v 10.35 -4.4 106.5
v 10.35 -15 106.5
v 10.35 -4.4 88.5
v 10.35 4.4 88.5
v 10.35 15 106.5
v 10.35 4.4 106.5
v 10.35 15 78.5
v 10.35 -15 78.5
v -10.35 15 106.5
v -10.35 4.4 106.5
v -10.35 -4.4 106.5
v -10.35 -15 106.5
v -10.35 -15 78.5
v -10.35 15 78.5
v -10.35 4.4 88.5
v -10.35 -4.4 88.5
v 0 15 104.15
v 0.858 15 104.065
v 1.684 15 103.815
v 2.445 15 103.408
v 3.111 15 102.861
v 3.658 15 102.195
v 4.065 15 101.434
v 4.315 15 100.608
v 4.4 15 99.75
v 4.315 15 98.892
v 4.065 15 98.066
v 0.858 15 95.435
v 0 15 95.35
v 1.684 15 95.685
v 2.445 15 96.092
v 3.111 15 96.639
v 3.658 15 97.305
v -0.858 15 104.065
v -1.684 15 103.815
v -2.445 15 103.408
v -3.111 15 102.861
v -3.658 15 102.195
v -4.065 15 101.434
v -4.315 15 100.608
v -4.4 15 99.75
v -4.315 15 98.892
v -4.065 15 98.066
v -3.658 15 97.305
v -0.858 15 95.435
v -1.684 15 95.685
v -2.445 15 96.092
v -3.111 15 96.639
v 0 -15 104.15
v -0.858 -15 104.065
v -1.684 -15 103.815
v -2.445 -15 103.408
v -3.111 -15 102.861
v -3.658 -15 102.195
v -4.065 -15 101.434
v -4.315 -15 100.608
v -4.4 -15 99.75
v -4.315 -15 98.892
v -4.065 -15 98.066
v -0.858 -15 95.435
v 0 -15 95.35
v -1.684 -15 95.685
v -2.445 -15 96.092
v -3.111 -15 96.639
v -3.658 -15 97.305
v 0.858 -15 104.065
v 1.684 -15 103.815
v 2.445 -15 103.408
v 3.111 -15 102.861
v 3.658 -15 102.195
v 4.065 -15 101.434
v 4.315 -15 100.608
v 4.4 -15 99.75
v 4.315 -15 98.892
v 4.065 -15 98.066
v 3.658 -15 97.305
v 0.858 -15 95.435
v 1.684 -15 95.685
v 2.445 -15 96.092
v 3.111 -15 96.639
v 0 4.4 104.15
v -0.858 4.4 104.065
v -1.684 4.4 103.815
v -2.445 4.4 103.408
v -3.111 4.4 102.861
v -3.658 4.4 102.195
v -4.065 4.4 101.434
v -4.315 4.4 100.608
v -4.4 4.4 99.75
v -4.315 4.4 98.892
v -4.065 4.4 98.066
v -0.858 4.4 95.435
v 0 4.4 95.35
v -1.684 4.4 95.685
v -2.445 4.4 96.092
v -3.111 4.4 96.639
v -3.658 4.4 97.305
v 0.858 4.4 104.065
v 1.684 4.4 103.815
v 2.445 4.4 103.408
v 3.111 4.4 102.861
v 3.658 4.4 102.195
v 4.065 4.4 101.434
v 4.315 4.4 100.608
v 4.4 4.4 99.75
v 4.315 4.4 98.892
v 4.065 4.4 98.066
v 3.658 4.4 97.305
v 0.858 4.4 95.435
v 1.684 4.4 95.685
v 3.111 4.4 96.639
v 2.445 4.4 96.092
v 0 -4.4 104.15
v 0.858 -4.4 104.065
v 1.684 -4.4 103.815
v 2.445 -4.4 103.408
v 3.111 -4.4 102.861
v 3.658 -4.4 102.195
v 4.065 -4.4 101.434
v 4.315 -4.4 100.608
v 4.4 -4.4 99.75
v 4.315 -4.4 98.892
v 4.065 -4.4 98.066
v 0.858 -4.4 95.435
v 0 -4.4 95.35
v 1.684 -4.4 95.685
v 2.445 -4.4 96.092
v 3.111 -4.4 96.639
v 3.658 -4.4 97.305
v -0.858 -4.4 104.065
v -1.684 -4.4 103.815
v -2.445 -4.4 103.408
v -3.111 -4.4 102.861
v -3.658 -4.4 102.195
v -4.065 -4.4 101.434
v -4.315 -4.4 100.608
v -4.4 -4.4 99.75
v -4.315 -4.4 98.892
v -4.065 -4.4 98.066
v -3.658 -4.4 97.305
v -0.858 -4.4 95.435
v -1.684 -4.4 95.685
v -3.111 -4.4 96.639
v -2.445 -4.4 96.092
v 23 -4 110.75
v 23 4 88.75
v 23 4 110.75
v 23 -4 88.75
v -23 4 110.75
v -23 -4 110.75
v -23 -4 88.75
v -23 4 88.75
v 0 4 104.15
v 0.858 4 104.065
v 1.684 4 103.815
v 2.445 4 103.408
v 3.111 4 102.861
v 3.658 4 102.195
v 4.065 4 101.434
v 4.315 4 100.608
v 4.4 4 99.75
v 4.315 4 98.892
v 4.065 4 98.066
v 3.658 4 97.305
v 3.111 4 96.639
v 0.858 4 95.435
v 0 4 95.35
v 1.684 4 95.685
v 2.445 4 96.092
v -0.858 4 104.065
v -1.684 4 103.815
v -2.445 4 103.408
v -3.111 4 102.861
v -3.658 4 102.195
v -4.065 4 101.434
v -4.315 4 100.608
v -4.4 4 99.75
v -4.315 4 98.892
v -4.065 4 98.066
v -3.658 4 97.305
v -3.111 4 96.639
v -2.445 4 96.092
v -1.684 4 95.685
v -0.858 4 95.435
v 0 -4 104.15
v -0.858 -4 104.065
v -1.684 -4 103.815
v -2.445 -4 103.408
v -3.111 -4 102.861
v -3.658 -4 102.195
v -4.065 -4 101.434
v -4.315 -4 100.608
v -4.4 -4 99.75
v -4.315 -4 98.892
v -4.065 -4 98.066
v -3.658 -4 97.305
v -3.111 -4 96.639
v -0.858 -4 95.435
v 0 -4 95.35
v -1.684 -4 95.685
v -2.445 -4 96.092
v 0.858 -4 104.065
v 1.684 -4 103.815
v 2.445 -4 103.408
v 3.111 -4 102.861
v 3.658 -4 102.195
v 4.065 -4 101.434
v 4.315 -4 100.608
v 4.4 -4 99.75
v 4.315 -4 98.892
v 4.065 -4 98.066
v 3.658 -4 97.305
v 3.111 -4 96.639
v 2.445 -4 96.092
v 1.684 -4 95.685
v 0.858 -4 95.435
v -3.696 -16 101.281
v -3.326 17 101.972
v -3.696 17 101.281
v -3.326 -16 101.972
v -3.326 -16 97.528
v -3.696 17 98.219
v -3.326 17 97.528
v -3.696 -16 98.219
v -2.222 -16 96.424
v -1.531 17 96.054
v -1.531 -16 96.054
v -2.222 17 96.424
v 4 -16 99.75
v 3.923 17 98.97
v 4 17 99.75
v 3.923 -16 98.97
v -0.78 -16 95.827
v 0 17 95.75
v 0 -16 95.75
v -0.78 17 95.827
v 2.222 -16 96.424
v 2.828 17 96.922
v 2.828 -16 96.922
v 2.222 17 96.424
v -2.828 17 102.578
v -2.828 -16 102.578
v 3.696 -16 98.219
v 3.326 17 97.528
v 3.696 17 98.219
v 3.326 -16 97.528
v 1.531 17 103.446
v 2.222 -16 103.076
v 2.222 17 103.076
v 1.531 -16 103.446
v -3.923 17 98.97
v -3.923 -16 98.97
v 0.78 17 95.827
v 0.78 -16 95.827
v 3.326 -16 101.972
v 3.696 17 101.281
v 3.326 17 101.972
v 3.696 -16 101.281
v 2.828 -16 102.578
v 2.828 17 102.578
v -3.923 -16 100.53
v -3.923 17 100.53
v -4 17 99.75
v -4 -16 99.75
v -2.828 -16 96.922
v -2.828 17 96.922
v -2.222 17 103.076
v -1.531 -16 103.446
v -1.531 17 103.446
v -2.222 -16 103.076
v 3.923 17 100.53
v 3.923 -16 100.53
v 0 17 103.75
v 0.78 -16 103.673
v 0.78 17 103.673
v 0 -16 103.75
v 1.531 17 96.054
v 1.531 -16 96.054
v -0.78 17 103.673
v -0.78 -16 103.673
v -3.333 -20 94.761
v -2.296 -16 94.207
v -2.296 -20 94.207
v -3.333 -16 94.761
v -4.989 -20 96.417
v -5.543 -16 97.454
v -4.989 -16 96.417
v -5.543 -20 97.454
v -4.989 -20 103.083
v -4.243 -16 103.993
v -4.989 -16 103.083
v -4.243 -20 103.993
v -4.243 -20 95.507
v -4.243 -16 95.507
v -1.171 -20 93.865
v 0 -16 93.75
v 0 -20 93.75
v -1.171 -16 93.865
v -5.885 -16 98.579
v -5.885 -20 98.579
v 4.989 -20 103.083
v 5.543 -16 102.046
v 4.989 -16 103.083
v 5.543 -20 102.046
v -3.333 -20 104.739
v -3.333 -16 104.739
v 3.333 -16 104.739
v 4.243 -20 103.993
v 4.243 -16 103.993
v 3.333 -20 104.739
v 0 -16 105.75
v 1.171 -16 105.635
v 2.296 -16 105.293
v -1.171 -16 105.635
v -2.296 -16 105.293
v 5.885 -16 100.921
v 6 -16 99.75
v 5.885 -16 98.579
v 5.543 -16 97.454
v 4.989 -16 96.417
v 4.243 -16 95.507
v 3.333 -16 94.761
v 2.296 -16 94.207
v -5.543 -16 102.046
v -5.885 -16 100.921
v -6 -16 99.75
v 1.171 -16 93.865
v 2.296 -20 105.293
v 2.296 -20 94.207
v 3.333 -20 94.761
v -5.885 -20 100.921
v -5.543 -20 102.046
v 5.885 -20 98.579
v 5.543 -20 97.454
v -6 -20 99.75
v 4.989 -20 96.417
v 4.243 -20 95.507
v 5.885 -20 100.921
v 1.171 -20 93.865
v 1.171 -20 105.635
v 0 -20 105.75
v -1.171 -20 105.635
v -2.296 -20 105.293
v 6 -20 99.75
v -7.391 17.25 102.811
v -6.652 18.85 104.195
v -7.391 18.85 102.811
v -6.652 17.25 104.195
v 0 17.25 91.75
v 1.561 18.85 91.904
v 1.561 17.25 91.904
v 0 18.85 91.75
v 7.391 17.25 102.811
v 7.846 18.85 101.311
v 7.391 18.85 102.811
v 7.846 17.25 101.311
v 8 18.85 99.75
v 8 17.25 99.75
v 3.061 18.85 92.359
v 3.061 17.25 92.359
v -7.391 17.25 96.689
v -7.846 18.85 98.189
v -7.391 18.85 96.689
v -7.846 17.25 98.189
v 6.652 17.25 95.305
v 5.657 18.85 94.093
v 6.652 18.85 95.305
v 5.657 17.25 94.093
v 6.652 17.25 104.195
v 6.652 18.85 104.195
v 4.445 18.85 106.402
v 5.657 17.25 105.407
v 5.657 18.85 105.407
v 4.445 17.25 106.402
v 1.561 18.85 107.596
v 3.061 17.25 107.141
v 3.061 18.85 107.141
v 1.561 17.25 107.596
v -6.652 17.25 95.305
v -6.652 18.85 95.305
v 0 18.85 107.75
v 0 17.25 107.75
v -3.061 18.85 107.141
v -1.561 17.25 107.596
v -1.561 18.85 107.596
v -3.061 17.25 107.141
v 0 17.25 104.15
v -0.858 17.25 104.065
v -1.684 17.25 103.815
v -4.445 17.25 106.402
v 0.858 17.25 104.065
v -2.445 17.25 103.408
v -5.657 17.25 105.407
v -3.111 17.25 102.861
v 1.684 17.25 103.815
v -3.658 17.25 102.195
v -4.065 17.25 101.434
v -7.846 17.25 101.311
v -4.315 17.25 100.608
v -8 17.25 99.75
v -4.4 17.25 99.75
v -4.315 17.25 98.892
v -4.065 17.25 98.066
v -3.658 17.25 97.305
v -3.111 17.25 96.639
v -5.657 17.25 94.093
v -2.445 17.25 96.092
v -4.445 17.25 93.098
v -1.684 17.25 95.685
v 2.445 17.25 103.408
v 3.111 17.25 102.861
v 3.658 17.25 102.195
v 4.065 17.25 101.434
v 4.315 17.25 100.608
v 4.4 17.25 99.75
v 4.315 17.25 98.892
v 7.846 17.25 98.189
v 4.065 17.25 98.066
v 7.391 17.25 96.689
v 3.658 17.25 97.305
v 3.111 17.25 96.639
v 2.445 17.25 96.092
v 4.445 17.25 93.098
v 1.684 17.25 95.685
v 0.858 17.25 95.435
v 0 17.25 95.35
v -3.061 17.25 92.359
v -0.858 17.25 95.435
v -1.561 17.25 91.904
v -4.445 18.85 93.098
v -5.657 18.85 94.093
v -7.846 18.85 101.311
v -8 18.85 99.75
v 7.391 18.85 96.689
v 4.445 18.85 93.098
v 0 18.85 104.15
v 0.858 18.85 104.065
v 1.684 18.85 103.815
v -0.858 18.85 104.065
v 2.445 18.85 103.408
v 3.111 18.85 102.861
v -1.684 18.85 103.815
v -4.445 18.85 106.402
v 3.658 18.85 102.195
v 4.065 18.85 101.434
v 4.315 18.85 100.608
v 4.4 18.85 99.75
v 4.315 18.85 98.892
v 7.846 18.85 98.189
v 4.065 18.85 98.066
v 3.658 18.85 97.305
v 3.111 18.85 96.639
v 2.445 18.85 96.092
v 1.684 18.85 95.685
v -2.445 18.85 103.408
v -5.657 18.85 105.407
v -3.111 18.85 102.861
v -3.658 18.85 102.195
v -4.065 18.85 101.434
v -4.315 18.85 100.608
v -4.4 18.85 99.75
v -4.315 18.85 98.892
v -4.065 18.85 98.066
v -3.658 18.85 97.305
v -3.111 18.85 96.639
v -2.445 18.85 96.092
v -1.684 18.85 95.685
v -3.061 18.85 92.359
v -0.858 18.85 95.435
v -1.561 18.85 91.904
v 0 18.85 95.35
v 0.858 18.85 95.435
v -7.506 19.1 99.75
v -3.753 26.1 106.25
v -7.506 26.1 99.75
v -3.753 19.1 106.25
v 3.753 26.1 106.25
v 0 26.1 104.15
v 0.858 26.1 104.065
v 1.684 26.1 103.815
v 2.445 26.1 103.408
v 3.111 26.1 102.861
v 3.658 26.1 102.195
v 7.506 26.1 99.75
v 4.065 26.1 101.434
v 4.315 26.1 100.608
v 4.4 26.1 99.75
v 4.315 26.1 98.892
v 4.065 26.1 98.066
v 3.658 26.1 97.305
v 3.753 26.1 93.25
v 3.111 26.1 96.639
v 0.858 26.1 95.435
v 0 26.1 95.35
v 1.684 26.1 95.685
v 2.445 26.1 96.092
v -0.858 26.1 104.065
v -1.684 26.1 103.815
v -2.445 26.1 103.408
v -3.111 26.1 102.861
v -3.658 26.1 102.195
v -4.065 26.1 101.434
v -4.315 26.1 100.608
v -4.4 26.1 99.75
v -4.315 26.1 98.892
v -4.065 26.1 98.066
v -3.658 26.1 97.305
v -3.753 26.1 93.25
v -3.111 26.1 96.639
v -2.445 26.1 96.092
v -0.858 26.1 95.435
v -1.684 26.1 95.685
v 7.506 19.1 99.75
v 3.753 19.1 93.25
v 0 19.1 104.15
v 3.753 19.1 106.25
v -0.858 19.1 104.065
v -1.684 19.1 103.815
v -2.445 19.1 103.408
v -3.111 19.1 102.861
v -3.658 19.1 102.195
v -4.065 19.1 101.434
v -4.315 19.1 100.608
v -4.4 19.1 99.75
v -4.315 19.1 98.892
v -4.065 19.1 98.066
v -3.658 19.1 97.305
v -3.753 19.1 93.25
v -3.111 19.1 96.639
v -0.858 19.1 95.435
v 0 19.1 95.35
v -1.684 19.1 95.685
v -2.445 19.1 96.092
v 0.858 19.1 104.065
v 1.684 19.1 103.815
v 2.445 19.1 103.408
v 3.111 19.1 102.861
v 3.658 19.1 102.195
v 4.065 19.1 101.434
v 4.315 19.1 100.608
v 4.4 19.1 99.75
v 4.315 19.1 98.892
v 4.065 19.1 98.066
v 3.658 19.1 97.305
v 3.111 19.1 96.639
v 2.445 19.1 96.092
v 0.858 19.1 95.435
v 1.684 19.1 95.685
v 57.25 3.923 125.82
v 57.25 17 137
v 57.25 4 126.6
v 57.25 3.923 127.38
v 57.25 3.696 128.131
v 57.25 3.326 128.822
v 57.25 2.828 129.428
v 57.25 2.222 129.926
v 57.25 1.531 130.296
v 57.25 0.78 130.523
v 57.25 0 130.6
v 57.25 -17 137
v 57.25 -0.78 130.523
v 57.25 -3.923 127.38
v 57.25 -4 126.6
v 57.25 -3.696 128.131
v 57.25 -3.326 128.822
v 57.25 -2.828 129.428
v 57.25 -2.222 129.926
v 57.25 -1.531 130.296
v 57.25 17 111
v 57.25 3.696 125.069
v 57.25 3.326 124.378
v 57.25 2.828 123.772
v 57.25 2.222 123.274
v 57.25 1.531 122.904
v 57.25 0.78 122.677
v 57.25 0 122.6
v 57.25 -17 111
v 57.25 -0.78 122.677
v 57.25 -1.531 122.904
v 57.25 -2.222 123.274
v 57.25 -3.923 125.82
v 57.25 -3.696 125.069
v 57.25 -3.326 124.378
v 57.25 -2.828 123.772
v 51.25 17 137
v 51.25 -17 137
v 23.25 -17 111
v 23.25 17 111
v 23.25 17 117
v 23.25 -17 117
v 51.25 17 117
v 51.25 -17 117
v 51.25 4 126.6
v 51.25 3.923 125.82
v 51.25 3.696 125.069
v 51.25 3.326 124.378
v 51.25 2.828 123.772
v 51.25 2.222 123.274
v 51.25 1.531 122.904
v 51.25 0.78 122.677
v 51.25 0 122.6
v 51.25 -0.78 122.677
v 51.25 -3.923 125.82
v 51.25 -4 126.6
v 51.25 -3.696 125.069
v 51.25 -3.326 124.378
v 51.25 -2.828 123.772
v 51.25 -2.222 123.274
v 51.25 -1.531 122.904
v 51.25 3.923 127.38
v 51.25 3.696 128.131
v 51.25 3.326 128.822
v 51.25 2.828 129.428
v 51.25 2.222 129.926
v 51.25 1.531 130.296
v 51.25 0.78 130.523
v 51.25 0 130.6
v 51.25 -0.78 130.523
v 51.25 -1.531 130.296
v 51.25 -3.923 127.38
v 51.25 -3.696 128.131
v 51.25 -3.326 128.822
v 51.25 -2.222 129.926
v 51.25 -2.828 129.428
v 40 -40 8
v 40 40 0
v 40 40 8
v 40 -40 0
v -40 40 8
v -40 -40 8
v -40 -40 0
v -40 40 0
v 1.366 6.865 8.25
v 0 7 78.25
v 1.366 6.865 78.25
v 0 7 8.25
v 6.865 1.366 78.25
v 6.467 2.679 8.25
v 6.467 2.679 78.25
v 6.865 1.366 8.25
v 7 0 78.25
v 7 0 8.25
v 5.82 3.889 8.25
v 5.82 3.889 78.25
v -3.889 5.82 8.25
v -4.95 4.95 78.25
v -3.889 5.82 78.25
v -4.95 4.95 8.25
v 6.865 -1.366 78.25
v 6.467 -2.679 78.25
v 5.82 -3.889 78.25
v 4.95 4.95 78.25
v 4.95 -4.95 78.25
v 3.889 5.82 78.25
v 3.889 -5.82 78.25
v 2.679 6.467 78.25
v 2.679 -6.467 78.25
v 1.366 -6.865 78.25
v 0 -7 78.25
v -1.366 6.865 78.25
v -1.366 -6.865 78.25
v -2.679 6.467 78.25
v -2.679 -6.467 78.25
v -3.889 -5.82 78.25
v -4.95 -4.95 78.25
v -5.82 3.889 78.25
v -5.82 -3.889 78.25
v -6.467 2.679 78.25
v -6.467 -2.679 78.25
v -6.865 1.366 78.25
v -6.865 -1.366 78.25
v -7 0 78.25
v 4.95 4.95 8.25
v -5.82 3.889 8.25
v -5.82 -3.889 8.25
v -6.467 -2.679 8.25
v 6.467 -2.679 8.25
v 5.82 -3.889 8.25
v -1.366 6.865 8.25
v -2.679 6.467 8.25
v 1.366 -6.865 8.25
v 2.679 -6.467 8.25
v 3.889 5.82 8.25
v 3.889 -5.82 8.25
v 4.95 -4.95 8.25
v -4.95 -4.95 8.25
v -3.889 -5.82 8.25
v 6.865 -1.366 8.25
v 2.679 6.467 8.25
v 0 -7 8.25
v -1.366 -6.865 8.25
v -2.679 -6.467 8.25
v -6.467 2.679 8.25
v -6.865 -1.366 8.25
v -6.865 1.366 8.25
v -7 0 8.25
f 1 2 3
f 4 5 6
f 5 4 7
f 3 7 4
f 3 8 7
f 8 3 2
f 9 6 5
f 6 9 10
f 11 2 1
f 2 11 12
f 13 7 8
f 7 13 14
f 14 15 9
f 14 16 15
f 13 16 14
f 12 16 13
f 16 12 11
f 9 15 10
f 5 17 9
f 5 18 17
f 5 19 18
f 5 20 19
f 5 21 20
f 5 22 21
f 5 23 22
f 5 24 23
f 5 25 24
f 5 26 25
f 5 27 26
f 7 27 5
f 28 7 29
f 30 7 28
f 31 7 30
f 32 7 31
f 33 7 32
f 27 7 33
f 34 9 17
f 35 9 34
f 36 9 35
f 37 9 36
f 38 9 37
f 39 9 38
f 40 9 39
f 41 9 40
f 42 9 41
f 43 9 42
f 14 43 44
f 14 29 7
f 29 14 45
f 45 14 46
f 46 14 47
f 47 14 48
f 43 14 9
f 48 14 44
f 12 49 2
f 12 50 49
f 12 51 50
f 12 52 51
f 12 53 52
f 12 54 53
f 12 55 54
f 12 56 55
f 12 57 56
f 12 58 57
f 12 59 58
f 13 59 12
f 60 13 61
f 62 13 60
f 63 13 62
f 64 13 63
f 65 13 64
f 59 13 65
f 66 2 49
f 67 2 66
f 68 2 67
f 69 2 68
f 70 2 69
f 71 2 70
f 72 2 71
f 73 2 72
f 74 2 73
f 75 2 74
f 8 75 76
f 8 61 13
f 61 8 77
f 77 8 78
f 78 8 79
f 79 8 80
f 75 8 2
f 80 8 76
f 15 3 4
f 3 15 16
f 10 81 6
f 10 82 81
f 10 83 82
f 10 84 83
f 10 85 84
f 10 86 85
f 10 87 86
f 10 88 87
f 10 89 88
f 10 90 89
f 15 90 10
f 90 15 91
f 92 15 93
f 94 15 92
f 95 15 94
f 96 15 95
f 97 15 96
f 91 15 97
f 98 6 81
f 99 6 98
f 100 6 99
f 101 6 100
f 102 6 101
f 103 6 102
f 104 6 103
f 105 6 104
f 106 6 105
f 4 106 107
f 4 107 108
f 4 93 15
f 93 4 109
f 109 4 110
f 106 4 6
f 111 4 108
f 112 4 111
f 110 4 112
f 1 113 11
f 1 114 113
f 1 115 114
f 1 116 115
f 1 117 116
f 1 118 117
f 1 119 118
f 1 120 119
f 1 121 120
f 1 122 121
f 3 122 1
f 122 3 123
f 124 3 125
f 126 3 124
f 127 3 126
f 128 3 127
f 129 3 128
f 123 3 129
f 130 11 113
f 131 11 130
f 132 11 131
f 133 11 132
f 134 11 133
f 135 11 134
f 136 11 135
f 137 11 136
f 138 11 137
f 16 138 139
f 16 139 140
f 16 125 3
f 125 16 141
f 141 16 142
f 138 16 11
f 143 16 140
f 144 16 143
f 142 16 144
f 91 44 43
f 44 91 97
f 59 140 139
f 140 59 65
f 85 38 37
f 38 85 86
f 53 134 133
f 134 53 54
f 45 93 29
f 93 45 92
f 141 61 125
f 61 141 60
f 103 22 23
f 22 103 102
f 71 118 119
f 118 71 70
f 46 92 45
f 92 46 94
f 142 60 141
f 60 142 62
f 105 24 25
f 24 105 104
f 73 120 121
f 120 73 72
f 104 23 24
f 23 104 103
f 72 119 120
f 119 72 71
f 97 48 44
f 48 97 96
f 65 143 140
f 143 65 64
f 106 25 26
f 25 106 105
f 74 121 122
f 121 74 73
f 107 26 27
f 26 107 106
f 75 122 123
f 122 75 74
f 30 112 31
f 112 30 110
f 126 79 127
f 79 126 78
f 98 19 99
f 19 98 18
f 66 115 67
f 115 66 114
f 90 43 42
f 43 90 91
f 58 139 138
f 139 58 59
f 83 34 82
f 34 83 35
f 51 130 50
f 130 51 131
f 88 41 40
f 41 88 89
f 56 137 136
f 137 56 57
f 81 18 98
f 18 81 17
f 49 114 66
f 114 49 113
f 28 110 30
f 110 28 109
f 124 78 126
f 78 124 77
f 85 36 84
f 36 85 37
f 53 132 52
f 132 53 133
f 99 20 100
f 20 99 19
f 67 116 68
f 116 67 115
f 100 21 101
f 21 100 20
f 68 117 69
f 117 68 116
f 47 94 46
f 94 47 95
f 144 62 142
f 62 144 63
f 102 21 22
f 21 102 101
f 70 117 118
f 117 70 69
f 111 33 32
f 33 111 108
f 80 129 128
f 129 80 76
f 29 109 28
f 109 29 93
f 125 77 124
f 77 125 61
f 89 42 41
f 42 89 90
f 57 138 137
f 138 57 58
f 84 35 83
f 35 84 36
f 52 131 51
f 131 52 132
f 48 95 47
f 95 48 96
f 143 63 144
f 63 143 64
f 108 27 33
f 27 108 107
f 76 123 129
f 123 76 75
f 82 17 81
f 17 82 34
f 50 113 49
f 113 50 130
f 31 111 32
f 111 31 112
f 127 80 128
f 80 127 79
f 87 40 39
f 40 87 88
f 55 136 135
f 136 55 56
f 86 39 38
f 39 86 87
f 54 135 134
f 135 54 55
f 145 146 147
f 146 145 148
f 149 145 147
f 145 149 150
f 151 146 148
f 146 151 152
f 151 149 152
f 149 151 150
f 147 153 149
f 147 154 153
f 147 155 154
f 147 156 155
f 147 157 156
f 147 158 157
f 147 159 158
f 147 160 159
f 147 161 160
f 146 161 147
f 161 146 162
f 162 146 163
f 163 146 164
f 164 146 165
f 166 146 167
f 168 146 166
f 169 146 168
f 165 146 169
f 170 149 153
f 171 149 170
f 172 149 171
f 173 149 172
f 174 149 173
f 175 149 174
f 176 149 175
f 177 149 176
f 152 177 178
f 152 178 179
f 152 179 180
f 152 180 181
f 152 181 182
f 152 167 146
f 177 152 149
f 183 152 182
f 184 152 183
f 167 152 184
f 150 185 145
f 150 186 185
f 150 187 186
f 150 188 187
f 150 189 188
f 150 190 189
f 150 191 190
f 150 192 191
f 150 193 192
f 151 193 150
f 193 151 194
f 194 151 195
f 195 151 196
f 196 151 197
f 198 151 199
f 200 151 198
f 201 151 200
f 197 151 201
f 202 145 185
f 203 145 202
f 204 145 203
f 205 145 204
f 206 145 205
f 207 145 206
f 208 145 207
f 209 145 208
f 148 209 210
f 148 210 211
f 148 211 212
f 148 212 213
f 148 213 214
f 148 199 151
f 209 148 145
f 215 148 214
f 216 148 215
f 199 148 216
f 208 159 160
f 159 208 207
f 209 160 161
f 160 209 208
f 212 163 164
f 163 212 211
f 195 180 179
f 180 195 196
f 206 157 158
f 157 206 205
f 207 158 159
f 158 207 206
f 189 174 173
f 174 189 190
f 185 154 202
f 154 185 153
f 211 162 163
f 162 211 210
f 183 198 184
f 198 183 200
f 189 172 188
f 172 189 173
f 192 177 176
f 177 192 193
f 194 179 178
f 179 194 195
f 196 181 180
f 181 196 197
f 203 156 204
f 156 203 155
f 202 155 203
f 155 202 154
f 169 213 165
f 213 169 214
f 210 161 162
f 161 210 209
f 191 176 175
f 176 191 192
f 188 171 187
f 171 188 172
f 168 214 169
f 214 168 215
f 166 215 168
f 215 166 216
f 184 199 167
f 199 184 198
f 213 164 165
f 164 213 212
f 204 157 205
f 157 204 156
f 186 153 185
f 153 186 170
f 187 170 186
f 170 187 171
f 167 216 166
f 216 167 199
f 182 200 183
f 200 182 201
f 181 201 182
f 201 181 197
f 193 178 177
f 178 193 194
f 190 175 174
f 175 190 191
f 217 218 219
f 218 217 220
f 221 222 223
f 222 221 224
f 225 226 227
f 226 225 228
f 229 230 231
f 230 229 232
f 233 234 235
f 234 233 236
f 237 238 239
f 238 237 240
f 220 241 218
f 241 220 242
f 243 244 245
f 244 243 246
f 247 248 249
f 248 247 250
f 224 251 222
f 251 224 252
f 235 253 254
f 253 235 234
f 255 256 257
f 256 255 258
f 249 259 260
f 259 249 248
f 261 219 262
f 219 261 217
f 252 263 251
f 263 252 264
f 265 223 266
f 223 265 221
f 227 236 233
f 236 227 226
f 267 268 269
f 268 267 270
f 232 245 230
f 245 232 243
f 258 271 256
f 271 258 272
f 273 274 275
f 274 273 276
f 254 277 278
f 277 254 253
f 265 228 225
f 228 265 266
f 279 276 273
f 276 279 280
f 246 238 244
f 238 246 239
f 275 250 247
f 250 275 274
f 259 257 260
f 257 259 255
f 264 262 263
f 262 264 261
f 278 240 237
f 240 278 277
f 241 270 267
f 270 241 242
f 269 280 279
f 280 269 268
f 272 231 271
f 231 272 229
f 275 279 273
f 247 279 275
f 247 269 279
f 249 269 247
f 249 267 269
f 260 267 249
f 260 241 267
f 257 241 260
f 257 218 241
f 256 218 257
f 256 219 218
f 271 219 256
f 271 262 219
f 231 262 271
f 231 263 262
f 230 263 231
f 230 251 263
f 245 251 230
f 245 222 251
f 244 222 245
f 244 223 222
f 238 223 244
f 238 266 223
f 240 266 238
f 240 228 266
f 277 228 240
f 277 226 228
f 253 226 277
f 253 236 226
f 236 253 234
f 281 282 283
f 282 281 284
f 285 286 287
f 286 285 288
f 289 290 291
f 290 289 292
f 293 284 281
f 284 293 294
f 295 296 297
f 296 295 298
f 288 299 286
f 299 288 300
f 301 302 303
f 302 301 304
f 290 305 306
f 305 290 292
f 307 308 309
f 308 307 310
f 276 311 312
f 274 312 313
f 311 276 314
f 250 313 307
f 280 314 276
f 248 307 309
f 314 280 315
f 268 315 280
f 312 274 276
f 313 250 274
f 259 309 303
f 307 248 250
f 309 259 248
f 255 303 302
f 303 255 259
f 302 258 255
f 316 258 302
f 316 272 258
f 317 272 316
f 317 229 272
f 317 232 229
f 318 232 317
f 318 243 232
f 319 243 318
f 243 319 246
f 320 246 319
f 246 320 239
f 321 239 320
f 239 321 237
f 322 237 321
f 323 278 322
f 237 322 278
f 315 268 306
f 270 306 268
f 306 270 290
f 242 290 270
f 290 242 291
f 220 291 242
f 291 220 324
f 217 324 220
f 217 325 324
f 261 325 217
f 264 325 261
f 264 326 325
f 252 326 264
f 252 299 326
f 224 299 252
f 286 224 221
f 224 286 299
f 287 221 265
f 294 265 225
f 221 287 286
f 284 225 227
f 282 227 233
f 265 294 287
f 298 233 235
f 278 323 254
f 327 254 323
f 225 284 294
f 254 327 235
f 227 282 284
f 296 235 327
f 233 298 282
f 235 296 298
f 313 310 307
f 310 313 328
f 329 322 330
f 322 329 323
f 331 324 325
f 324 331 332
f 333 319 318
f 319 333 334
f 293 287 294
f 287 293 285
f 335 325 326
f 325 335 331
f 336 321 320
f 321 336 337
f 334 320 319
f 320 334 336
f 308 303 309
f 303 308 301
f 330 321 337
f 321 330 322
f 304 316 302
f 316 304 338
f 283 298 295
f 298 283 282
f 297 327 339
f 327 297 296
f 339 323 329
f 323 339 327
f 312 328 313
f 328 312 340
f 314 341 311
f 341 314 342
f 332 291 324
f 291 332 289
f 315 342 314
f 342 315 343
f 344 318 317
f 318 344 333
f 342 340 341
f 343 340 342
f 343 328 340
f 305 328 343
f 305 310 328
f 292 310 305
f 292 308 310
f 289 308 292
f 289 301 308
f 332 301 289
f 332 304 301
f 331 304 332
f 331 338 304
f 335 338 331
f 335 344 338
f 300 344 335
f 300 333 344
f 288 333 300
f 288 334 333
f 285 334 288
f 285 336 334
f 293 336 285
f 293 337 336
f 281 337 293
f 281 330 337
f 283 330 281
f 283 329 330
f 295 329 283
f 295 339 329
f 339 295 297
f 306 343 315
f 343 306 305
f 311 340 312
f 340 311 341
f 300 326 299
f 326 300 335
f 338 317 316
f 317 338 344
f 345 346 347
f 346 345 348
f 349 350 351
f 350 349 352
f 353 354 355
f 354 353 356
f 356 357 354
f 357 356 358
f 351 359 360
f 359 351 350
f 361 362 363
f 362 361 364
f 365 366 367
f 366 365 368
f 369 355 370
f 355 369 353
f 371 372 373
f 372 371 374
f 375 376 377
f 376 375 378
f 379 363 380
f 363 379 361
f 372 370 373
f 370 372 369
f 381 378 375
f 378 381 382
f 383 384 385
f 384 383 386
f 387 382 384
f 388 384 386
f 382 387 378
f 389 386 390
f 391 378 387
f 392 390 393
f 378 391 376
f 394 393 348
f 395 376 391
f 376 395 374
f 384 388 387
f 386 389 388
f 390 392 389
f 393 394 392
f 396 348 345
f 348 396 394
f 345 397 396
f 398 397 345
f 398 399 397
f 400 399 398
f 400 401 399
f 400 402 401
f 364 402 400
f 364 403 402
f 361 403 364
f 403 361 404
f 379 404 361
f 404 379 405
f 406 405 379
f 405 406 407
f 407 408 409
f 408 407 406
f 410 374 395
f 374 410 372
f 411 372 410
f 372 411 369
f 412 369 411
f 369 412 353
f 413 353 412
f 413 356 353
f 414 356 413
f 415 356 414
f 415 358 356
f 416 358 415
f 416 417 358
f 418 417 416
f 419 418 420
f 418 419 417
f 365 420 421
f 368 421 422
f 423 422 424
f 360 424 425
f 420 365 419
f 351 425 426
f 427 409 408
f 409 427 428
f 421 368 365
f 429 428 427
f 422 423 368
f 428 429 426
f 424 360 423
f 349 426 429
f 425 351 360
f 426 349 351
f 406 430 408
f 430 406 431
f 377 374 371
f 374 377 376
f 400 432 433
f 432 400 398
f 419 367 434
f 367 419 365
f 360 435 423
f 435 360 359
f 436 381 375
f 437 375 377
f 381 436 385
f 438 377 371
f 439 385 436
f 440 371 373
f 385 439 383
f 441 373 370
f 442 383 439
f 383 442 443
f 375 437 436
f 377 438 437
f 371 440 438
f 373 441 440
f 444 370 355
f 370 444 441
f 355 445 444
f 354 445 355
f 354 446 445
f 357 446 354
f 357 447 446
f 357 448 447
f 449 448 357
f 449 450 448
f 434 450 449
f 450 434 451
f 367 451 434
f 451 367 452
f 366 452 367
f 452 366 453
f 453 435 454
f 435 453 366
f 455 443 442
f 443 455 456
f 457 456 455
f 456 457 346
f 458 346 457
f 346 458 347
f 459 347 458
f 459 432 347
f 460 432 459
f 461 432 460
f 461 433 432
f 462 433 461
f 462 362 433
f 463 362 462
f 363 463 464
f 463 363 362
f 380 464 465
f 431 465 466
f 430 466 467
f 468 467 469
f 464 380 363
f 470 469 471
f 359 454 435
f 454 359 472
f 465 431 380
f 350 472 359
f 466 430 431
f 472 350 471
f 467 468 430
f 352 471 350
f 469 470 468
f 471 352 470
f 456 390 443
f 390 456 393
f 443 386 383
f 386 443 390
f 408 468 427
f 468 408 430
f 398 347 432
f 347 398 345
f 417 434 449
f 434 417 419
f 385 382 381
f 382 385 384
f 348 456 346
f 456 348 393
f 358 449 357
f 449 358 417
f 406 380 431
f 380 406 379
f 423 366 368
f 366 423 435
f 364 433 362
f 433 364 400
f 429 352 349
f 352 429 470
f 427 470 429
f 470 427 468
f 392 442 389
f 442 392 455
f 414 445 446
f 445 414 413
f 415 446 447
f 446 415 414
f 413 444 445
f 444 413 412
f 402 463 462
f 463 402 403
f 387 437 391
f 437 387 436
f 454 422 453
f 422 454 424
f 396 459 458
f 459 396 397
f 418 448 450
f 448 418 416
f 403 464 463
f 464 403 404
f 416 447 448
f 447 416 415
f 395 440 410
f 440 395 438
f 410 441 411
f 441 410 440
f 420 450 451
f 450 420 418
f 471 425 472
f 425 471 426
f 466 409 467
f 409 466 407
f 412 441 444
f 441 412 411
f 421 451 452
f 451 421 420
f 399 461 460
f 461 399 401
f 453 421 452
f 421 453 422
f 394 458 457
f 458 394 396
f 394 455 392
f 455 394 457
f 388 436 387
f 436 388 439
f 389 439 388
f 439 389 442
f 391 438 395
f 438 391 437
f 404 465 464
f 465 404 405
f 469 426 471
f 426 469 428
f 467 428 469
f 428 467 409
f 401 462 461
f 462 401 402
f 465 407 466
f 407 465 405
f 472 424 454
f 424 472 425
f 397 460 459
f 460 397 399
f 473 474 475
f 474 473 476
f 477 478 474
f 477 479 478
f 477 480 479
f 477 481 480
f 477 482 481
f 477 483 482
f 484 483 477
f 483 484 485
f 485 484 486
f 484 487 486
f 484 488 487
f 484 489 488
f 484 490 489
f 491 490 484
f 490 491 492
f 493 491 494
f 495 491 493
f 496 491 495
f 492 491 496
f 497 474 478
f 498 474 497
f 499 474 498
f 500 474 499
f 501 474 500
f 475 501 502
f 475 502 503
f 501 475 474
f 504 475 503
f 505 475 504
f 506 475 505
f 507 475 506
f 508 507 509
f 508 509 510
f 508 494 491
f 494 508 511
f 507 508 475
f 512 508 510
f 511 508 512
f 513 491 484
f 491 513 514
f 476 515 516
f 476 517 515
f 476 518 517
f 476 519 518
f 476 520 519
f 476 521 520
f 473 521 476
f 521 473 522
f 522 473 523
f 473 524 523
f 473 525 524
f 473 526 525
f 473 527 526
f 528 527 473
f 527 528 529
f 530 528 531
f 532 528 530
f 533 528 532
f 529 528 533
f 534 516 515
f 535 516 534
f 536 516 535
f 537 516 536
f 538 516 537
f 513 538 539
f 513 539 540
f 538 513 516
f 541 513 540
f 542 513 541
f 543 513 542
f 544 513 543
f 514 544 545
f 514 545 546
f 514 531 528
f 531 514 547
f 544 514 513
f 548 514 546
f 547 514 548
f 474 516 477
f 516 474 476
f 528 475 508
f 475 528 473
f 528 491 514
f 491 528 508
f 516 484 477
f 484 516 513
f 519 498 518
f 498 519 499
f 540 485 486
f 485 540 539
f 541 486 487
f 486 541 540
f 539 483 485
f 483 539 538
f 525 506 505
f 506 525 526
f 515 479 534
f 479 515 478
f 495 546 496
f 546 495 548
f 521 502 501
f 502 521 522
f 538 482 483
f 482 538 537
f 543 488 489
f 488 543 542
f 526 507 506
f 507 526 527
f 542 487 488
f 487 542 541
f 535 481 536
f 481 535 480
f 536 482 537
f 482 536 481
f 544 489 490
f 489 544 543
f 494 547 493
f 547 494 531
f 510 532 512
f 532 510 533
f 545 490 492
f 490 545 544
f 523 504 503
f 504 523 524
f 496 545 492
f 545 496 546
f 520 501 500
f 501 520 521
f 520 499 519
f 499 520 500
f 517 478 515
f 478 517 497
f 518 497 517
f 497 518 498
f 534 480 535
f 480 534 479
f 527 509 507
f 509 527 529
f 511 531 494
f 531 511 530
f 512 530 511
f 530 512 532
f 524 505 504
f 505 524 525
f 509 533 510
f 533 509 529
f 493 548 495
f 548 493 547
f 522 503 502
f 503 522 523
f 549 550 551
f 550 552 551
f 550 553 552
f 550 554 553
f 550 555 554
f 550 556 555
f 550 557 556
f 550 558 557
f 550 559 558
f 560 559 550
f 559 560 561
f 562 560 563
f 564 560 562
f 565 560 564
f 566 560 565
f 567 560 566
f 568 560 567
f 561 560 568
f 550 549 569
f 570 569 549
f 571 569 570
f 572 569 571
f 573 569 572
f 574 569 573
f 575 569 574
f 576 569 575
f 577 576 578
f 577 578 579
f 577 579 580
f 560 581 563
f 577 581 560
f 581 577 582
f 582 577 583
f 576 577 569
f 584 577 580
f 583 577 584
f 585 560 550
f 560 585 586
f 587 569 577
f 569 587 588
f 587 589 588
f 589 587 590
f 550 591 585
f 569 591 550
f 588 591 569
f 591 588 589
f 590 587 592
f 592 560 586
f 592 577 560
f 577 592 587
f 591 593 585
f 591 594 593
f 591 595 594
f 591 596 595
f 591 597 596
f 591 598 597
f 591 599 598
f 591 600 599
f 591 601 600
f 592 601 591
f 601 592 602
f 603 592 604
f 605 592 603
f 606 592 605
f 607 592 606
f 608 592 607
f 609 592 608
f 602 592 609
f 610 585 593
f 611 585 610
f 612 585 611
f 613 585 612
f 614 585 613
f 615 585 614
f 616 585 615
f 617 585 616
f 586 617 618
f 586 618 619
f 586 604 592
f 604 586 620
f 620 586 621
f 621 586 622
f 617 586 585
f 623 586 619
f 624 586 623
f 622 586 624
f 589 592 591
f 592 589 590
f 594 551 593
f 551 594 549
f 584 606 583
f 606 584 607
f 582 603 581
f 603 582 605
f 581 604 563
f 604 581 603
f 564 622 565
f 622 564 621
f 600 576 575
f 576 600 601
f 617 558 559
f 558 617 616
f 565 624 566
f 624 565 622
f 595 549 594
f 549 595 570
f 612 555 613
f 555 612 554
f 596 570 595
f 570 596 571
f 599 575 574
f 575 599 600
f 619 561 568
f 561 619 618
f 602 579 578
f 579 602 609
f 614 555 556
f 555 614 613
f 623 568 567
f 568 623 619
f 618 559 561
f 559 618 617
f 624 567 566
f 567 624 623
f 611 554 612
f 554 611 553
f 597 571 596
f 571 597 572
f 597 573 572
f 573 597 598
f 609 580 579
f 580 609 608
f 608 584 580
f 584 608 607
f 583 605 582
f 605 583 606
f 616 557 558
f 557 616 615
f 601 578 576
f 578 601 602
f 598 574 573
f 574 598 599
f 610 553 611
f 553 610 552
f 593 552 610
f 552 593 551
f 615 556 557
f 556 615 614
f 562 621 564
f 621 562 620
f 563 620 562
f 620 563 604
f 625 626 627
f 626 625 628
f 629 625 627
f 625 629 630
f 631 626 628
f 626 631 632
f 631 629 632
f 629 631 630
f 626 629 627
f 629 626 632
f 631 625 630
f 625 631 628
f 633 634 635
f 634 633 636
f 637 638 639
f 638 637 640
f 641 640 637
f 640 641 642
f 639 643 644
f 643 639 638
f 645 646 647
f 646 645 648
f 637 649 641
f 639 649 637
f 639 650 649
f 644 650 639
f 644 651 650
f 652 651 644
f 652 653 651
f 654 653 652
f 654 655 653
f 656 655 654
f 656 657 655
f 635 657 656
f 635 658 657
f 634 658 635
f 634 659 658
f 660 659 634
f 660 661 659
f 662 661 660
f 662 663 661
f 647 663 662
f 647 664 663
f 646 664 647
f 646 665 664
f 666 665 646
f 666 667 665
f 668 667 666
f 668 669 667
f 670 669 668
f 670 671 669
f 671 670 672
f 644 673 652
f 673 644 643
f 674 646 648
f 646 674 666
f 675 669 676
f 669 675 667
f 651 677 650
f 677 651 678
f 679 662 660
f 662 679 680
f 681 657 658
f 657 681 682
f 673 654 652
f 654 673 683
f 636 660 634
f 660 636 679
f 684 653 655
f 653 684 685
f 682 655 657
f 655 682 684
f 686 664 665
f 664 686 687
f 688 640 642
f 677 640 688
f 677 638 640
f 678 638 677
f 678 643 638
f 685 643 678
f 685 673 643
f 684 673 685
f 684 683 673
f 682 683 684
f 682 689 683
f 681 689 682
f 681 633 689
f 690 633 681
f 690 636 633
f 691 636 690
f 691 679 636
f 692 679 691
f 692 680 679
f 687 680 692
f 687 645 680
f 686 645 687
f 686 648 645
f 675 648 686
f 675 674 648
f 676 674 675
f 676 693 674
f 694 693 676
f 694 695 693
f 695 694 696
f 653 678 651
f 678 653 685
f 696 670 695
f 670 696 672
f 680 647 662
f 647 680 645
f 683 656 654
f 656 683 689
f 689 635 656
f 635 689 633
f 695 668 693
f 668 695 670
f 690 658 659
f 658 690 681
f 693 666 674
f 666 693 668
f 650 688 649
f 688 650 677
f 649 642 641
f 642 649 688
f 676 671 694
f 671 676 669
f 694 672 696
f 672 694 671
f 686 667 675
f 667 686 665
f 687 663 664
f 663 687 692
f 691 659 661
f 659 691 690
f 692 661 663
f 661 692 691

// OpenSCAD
$fn = 32;

// ------------------------------------------------------------------------
// Lamp arm: column d14 x 70 mm, arm 46 mm
// Every part is its own module, assembly() places every instance.
// ------------------------------------------------------------------------

// --- part 1 ---
module lamp_base() {
  difference() {
    translate([-40, -40, 0]) cube([80, 80, 8]);
  }
}

// --- part 2 ---
module lamp_column() {
  cylinder(h = 70, d = 14);
}

// --- part 3 ---
module head_fork() {
  difference() {
    translate([-10.35, -15, 0]) cube([20.7, 30, 28]);
    translate([-11.35, -4.4, 10]) cube([22.7, 8.8, 19]);
    translate([0, 0, 21.25]) rotate([90, 0, 0]) cylinder(h = 32, d = 8.8, center = true);
  }
}

// --- part 4 ---
module lamp_arm() {
  difference() {
    translate([-23, -4, 0]) cube([46, 8, 22]);
    translate([0, 0, 11]) rotate([90, 0, 0]) cylinder(h = 10, d = 8.8, center = true);
  }
}

// --- part 5 ---
module arm_pin() {
  rotate([0, 90, 0]) cylinder(h = 34, d = 8, center = true);
  translate([-20, 0, 0]) rotate([0, 90, 0]) cylinder(h = 4, d = 12);
}

// --- part 6 ---
module arm_washer() {
  difference() {
      translate([0, 0, 0]) cylinder(h = 1.6, d = 16);
      translate([0, 0, -1]) cylinder(h = 3.6, d = 8.8);
    }
}

// --- part 7 ---
module arm_nut() {
  difference() {
    linear_extrude(height = 7) polygon(points = [[7.506, 0], [3.753, 6.5], [-3.753, 6.5], [-7.506, 0], [-3.753, -6.5], [3.753, -6.5]]);
    translate([0, 0, -1]) cylinder(h = 9, d = 8.8);
  }
}

// --- part 8 ---
module shade_bracket() {
  difference() {
    translate([-17, -17, 0]) cube([34, 34, 26]);
    translate([-18, -18, 6]) cube([29, 36, 21]);
    translate([14, 0, 15.6]) rotate([0, 90, 0]) cylinder(h = 8, d = 8, center = true);
  }
}

// --- assembly ---
module assembly() {
  color([0.80, 0.24, 0.20]) translate([0, 0, 0]) rotate([0, 0, 0]) lamp_base();
  color([0.20, 0.45, 0.75]) translate([0, 0, 8.25]) rotate([0, 0, 0]) lamp_column();
  color([0.25, 0.62, 0.32]) translate([0, 0, 78.5]) rotate([0, 0, 0]) head_fork();
  color([0.92, 0.70, 0.18]) translate([0, 0, 88.75]) rotate([0, 0, 0]) lamp_arm();
  color([0.58, 0.35, 0.70]) translate([0, 0, 99.75]) rotate([0, 0, 90]) arm_pin();
  color([0.16, 0.66, 0.66]) translate([0, 18.85, 99.75]) rotate([90, 0, 0]) arm_washer();
  color([0.85, 0.48, 0.18]) translate([0, 26.1, 99.75]) rotate([90, 0, 0]) arm_nut();
  color([0.55, 0.60, 0.65]) translate([40.25, 0, 111]) rotate([0, 0, 0]) shade_bracket();
}

assembly();
